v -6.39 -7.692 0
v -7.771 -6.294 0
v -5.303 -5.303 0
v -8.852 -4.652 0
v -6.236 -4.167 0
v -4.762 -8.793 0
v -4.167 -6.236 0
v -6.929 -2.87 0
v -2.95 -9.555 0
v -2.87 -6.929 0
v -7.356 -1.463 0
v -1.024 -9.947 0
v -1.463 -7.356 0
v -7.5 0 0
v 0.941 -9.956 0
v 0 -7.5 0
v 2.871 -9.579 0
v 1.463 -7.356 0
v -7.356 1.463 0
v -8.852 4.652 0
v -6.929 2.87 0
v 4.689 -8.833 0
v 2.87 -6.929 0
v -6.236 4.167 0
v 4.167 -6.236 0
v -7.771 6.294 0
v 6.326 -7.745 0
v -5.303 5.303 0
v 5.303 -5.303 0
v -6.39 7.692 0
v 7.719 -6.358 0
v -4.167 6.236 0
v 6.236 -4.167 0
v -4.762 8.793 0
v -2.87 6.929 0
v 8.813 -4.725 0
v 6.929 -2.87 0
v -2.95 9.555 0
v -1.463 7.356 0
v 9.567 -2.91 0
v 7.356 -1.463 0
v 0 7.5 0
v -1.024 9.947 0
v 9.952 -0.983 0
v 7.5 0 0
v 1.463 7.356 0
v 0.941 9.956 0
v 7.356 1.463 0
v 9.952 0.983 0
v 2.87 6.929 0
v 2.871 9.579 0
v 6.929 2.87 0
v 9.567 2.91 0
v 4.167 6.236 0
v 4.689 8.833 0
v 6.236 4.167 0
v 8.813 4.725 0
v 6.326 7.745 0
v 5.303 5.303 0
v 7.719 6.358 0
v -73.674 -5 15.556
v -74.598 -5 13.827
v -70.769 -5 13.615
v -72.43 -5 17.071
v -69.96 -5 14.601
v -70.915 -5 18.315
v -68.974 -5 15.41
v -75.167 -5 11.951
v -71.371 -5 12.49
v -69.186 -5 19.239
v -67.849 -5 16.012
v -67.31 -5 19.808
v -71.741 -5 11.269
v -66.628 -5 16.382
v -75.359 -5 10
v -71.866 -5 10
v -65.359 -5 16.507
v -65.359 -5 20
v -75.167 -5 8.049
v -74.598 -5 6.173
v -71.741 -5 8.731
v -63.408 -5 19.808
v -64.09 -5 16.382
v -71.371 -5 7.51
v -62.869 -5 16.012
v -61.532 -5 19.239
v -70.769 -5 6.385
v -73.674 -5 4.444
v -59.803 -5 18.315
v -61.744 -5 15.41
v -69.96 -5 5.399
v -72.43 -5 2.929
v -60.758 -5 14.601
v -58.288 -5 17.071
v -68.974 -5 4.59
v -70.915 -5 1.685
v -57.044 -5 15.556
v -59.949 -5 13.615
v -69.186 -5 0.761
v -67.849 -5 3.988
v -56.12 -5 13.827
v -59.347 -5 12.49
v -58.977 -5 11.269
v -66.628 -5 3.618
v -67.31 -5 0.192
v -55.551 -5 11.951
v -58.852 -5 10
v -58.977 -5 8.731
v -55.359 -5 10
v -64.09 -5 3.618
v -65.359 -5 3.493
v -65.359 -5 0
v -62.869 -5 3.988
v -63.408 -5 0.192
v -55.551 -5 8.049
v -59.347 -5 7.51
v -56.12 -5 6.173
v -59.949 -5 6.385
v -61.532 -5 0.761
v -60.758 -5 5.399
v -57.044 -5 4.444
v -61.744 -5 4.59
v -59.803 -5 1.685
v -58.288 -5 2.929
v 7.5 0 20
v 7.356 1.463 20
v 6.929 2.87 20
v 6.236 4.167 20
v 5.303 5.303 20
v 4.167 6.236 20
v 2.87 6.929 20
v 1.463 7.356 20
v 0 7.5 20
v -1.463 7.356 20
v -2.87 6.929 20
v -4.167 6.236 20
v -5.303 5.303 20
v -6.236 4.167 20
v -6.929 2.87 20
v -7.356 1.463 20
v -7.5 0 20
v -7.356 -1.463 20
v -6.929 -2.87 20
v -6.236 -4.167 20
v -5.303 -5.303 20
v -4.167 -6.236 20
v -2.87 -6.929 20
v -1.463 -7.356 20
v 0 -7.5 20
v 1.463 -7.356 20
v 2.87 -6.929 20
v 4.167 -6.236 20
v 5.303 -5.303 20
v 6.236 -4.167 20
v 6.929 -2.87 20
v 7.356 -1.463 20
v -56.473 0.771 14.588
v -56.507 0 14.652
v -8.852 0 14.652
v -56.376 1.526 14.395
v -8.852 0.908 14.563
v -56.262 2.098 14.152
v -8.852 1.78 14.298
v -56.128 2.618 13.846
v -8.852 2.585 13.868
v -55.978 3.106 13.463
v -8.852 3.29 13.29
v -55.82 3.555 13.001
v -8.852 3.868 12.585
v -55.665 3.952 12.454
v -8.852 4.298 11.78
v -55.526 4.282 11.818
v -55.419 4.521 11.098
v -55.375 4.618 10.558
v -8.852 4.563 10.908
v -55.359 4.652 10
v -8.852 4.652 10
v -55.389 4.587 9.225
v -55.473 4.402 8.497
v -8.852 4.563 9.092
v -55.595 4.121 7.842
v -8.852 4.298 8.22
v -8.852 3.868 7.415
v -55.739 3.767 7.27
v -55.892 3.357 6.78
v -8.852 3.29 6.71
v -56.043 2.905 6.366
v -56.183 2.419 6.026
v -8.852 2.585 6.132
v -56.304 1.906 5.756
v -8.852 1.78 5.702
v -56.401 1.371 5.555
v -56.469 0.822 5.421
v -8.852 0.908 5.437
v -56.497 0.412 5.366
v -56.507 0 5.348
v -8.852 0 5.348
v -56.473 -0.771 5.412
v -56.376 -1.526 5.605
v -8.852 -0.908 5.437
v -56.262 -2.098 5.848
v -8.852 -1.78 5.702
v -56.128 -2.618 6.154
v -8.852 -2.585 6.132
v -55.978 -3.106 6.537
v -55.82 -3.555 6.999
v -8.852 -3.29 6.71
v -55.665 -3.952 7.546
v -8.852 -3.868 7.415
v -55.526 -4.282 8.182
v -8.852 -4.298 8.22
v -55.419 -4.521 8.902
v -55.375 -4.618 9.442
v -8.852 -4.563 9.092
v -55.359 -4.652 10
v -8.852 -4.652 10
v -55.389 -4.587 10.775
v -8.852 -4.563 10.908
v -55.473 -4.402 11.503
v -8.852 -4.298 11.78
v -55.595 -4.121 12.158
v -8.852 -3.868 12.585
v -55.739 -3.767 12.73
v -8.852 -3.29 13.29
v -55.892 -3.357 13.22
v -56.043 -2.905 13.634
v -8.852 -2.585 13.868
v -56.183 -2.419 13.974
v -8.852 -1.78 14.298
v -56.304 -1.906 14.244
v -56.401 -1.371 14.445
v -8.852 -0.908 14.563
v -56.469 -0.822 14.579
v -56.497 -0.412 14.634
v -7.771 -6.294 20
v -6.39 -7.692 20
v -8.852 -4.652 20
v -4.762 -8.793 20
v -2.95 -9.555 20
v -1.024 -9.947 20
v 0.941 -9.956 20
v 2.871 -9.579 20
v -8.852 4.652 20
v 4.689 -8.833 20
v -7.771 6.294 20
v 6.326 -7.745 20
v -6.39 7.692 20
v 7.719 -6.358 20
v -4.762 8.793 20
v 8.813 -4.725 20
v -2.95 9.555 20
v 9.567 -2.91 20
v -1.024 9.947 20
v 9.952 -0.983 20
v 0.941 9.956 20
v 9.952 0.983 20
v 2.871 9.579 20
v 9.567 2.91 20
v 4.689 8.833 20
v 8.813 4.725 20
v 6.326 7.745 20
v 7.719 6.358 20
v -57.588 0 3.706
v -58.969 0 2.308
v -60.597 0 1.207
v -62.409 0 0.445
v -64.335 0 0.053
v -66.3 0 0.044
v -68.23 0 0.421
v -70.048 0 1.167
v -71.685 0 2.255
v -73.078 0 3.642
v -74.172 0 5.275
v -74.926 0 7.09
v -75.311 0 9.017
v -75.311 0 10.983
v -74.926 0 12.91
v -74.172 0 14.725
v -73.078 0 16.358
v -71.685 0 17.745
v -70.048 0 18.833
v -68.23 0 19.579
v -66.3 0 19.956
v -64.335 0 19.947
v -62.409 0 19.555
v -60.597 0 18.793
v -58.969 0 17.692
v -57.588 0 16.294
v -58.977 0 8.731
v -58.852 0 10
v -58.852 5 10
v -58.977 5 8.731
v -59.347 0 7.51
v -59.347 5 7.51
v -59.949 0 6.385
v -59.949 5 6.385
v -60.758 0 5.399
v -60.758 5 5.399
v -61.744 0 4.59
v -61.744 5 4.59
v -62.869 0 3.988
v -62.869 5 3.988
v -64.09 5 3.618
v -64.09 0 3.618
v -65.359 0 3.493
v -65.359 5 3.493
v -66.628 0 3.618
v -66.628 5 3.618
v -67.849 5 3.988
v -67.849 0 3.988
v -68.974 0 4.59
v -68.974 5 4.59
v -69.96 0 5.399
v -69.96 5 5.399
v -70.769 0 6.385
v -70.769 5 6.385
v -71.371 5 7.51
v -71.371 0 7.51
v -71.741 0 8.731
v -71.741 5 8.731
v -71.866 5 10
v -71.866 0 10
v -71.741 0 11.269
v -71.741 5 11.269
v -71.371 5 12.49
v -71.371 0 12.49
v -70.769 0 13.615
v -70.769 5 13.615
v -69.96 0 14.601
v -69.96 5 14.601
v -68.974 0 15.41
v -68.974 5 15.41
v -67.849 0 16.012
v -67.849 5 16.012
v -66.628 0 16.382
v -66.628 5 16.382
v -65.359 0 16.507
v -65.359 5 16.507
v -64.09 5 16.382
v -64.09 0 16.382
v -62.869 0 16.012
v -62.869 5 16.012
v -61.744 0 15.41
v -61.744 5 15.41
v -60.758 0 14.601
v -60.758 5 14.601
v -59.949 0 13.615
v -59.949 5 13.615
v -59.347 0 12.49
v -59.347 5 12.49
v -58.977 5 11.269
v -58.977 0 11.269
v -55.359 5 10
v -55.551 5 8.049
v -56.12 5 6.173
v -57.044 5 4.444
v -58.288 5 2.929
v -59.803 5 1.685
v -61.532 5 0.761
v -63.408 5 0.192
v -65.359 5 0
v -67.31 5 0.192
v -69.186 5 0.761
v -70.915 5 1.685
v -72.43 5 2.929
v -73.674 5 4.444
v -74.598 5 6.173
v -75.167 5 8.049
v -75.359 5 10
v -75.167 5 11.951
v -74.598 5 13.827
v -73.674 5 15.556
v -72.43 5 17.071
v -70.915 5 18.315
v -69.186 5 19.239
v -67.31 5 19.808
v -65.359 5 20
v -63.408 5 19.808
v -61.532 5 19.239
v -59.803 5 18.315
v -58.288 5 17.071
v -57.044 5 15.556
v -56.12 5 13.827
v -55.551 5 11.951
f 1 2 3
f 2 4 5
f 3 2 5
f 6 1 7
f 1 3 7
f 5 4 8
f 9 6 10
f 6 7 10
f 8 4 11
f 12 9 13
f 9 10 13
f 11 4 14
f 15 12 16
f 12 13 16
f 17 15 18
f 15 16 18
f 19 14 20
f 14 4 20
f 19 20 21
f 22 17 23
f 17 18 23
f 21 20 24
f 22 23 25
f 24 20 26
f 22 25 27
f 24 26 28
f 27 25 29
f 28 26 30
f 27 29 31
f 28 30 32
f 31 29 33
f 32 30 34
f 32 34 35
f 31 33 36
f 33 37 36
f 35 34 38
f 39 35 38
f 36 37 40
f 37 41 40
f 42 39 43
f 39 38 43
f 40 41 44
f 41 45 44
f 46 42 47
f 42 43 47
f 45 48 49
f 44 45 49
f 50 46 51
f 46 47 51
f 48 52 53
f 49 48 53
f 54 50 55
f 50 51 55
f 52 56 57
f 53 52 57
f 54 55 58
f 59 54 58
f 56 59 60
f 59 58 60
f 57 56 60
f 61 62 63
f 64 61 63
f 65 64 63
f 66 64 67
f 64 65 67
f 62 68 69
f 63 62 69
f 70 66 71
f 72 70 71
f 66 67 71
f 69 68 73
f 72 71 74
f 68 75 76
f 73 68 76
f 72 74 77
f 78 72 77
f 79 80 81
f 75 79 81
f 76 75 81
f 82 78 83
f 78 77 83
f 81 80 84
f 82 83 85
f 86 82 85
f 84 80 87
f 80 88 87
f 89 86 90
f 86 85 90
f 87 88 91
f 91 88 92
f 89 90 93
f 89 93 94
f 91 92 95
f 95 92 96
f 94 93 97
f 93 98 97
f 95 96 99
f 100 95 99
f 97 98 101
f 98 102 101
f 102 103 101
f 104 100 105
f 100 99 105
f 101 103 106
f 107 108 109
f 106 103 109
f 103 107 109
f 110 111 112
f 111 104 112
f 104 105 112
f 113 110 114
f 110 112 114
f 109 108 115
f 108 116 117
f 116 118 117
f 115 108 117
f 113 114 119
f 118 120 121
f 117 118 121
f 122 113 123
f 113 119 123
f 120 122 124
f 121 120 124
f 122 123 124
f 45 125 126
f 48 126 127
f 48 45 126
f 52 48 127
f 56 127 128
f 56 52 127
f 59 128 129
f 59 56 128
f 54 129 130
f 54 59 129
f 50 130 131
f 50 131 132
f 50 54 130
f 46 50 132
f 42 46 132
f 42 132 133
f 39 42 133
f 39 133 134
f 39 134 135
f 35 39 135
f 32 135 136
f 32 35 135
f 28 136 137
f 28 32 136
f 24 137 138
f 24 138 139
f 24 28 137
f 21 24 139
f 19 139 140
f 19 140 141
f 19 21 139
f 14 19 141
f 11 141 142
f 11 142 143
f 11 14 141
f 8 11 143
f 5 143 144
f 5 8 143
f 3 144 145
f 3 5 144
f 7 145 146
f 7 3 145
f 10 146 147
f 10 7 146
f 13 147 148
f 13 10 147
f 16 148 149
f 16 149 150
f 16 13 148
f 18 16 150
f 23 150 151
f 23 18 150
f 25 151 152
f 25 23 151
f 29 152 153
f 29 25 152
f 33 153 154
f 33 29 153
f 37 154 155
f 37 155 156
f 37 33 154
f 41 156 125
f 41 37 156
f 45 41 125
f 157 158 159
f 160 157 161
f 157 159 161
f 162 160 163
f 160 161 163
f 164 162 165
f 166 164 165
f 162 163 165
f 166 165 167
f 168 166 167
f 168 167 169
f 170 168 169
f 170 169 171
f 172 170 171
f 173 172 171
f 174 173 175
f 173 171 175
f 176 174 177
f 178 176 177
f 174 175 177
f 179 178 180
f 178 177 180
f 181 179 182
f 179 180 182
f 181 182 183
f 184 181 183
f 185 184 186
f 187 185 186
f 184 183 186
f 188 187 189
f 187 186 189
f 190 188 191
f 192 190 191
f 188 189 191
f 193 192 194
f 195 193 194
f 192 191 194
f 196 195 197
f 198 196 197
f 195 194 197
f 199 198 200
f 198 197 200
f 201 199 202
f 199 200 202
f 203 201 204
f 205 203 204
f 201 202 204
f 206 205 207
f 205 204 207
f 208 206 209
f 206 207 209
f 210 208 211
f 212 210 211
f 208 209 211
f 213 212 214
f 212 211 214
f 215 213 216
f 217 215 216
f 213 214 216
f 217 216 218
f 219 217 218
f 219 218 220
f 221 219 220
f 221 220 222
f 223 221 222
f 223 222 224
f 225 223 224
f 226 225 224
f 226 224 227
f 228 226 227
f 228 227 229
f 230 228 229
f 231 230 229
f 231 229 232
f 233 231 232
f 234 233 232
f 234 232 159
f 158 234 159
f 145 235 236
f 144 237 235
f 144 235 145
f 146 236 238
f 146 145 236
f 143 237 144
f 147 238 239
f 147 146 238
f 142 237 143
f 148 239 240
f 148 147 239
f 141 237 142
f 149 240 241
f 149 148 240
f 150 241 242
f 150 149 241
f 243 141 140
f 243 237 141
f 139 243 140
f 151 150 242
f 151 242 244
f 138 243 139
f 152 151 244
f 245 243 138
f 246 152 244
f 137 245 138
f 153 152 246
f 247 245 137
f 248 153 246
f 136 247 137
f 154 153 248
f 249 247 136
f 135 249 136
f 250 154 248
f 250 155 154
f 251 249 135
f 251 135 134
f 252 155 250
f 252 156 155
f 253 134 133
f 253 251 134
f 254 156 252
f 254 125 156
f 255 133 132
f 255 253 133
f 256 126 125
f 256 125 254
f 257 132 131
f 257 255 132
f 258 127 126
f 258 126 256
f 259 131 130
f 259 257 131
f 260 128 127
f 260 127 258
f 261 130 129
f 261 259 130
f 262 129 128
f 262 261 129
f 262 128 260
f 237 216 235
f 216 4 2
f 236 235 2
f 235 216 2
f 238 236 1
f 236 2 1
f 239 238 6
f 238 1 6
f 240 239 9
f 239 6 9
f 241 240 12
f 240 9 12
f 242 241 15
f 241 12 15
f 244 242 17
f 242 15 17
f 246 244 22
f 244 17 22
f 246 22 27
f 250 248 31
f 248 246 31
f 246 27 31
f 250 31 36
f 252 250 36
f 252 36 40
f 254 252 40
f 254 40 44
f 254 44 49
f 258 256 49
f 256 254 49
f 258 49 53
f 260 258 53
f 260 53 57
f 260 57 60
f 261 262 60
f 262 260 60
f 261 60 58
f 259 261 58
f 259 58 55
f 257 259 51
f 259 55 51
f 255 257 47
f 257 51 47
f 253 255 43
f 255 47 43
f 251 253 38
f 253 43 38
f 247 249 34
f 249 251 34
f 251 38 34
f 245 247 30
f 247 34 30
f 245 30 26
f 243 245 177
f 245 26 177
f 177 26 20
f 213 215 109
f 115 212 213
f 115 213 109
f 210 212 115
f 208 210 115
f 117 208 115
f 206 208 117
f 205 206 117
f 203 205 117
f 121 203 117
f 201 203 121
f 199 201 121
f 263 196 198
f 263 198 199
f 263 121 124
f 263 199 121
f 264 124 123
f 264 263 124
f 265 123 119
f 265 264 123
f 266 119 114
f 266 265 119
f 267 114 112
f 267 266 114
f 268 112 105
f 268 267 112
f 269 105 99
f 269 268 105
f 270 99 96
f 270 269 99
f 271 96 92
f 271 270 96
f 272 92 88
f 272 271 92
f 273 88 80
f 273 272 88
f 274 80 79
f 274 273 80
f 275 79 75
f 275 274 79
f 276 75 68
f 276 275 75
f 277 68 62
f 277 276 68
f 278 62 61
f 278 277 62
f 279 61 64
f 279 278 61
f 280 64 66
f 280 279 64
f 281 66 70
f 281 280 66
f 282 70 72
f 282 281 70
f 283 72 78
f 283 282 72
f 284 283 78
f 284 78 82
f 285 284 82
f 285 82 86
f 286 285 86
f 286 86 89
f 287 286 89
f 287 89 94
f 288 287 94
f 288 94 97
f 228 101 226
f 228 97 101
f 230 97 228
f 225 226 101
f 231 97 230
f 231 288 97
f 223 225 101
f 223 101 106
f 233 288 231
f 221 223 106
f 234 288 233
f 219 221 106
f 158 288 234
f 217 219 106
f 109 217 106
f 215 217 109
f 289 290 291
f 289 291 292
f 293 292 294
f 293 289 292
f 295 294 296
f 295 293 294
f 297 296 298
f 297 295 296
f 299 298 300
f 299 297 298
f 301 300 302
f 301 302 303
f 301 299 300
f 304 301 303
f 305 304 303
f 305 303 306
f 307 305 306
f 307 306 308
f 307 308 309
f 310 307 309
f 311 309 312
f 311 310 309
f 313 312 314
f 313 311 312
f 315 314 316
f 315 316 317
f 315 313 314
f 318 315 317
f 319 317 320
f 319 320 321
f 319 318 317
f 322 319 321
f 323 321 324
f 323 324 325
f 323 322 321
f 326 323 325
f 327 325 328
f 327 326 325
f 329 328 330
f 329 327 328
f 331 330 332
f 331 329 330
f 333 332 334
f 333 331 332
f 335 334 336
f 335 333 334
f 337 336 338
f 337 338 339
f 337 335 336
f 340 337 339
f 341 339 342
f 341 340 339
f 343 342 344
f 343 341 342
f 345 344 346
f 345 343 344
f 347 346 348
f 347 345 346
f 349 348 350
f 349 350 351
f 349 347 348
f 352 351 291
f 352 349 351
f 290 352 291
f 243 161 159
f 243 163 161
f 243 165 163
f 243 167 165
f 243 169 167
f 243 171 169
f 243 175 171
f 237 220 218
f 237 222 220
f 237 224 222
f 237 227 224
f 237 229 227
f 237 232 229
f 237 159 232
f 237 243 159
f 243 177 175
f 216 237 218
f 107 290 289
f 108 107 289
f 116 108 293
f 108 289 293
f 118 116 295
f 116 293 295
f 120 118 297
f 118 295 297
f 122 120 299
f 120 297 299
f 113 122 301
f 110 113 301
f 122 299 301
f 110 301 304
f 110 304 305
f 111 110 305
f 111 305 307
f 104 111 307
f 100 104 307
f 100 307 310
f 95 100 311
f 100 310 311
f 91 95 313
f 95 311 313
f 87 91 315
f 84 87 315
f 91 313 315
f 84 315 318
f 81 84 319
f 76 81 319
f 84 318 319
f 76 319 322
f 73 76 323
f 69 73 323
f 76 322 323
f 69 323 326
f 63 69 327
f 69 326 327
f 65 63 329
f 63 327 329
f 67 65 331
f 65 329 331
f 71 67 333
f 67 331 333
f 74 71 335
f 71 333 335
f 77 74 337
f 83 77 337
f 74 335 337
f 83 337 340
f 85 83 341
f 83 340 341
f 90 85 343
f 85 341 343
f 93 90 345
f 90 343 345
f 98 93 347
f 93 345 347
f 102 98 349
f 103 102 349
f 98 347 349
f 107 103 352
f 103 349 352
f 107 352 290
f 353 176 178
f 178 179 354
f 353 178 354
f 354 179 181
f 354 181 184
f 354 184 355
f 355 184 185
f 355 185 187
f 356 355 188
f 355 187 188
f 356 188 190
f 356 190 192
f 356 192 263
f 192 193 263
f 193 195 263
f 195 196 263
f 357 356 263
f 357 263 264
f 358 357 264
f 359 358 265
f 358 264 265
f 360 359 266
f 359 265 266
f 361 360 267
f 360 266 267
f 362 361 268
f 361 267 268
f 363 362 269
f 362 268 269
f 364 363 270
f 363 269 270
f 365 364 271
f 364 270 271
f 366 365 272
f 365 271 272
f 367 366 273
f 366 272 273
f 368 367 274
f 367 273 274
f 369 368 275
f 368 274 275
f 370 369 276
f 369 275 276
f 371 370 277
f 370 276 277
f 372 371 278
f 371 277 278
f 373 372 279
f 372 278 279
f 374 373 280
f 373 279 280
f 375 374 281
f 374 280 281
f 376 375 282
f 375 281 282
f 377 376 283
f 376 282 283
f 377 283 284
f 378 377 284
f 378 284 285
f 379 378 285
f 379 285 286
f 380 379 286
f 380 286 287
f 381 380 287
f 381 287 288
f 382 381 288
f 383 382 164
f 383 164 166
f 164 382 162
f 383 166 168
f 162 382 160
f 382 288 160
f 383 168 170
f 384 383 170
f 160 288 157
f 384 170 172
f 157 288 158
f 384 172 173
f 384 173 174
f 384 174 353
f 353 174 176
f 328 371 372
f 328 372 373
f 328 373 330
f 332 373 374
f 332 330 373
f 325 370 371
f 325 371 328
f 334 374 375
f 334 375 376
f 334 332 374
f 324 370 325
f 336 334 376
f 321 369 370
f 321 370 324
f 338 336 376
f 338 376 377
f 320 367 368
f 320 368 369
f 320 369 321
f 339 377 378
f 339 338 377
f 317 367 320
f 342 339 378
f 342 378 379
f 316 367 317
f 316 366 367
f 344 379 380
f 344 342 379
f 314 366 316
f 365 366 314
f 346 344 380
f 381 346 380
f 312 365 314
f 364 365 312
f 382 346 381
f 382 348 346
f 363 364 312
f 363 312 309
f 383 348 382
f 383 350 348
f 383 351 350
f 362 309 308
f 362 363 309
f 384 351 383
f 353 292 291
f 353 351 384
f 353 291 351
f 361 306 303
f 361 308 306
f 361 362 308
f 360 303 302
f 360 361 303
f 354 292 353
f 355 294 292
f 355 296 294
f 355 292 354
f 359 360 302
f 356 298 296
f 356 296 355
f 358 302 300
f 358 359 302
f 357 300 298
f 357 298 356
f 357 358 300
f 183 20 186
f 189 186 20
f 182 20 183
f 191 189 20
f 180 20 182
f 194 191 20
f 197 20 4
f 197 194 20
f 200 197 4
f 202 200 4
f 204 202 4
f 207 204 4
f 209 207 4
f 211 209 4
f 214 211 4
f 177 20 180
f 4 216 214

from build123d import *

# Parameters (mm, degrees)
SKETCH2_R                = 10
SKETCH2_R_2              = 7.5
BOSS_EXTRUDE1_DEPTH      = 20
CUT_EXTRUDE1_START       = -20
CUT_EXTRUDE1_DEPTH       = 20
SKETCH4_R                = 4.652081996
BOSS_EXTRUDE2_DEPTH      = 50
BOSS_EXTRUDE3_DEPTH      = 5
BOSS_EXTRUDE3_DEPTH_BACK = 5
SKETCH5_R                = 10
SKETCH5_R_2              = 6.506978502


with BuildPart() as part:
    # Sketch2 → Boss-Extrude1 (new body)
    with BuildSketch(Plane.XY):
        Circle(SKETCH2_R)
        Circle(SKETCH2_R_2, mode=Mode.SUBTRACT)
    extrude(amount=BOSS_EXTRUDE1_DEPTH)

    # Sketch3 → Cut-Extrude1 (cut)
    with BuildSketch(Plane.XY.offset(20).offset(CUT_EXTRUDE1_START)):
        with BuildLine():
            Line((-8.852012941, 4.652081996), (-8.852012941, -4.652081996))
            ThreePointArc((-8.852012941, -4.652081996), (-10, 0), (-8.852012941, 4.652081996))
        make_face()
    extrude(amount=CUT_EXTRUDE1_DEPTH, mode=Mode.SUBTRACT)

    # Sketch4 → Boss-Extrude2 (add)
    with BuildSketch(Plane.ZY.offset(8.852012941)):
        with Locations((10, 0)):
            Circle(SKETCH4_R)
    extrude(amount=BOSS_EXTRUDE2_DEPTH)

    # Sketch5 → Boss-Extrude3 (add, two sides: drawn at the far end of the back side and taken through both)
    with BuildSketch(Plane(origin=(0, 0, 0), x_dir=(1, 0, 0), z_dir=(0, 1, 0)).offset(-BOSS_EXTRUDE3_DEPTH_BACK)):
        with Locations((-65.358991443, -10)):
            Circle(SKETCH5_R)
        with Locations((-65.358991443, -10)):
            Circle(SKETCH5_R_2, mode=Mode.SUBTRACT)
    extrude(amount=BOSS_EXTRUDE3_DEPTH + BOSS_EXTRUDE3_DEPTH_BACK)


solid = part.part
